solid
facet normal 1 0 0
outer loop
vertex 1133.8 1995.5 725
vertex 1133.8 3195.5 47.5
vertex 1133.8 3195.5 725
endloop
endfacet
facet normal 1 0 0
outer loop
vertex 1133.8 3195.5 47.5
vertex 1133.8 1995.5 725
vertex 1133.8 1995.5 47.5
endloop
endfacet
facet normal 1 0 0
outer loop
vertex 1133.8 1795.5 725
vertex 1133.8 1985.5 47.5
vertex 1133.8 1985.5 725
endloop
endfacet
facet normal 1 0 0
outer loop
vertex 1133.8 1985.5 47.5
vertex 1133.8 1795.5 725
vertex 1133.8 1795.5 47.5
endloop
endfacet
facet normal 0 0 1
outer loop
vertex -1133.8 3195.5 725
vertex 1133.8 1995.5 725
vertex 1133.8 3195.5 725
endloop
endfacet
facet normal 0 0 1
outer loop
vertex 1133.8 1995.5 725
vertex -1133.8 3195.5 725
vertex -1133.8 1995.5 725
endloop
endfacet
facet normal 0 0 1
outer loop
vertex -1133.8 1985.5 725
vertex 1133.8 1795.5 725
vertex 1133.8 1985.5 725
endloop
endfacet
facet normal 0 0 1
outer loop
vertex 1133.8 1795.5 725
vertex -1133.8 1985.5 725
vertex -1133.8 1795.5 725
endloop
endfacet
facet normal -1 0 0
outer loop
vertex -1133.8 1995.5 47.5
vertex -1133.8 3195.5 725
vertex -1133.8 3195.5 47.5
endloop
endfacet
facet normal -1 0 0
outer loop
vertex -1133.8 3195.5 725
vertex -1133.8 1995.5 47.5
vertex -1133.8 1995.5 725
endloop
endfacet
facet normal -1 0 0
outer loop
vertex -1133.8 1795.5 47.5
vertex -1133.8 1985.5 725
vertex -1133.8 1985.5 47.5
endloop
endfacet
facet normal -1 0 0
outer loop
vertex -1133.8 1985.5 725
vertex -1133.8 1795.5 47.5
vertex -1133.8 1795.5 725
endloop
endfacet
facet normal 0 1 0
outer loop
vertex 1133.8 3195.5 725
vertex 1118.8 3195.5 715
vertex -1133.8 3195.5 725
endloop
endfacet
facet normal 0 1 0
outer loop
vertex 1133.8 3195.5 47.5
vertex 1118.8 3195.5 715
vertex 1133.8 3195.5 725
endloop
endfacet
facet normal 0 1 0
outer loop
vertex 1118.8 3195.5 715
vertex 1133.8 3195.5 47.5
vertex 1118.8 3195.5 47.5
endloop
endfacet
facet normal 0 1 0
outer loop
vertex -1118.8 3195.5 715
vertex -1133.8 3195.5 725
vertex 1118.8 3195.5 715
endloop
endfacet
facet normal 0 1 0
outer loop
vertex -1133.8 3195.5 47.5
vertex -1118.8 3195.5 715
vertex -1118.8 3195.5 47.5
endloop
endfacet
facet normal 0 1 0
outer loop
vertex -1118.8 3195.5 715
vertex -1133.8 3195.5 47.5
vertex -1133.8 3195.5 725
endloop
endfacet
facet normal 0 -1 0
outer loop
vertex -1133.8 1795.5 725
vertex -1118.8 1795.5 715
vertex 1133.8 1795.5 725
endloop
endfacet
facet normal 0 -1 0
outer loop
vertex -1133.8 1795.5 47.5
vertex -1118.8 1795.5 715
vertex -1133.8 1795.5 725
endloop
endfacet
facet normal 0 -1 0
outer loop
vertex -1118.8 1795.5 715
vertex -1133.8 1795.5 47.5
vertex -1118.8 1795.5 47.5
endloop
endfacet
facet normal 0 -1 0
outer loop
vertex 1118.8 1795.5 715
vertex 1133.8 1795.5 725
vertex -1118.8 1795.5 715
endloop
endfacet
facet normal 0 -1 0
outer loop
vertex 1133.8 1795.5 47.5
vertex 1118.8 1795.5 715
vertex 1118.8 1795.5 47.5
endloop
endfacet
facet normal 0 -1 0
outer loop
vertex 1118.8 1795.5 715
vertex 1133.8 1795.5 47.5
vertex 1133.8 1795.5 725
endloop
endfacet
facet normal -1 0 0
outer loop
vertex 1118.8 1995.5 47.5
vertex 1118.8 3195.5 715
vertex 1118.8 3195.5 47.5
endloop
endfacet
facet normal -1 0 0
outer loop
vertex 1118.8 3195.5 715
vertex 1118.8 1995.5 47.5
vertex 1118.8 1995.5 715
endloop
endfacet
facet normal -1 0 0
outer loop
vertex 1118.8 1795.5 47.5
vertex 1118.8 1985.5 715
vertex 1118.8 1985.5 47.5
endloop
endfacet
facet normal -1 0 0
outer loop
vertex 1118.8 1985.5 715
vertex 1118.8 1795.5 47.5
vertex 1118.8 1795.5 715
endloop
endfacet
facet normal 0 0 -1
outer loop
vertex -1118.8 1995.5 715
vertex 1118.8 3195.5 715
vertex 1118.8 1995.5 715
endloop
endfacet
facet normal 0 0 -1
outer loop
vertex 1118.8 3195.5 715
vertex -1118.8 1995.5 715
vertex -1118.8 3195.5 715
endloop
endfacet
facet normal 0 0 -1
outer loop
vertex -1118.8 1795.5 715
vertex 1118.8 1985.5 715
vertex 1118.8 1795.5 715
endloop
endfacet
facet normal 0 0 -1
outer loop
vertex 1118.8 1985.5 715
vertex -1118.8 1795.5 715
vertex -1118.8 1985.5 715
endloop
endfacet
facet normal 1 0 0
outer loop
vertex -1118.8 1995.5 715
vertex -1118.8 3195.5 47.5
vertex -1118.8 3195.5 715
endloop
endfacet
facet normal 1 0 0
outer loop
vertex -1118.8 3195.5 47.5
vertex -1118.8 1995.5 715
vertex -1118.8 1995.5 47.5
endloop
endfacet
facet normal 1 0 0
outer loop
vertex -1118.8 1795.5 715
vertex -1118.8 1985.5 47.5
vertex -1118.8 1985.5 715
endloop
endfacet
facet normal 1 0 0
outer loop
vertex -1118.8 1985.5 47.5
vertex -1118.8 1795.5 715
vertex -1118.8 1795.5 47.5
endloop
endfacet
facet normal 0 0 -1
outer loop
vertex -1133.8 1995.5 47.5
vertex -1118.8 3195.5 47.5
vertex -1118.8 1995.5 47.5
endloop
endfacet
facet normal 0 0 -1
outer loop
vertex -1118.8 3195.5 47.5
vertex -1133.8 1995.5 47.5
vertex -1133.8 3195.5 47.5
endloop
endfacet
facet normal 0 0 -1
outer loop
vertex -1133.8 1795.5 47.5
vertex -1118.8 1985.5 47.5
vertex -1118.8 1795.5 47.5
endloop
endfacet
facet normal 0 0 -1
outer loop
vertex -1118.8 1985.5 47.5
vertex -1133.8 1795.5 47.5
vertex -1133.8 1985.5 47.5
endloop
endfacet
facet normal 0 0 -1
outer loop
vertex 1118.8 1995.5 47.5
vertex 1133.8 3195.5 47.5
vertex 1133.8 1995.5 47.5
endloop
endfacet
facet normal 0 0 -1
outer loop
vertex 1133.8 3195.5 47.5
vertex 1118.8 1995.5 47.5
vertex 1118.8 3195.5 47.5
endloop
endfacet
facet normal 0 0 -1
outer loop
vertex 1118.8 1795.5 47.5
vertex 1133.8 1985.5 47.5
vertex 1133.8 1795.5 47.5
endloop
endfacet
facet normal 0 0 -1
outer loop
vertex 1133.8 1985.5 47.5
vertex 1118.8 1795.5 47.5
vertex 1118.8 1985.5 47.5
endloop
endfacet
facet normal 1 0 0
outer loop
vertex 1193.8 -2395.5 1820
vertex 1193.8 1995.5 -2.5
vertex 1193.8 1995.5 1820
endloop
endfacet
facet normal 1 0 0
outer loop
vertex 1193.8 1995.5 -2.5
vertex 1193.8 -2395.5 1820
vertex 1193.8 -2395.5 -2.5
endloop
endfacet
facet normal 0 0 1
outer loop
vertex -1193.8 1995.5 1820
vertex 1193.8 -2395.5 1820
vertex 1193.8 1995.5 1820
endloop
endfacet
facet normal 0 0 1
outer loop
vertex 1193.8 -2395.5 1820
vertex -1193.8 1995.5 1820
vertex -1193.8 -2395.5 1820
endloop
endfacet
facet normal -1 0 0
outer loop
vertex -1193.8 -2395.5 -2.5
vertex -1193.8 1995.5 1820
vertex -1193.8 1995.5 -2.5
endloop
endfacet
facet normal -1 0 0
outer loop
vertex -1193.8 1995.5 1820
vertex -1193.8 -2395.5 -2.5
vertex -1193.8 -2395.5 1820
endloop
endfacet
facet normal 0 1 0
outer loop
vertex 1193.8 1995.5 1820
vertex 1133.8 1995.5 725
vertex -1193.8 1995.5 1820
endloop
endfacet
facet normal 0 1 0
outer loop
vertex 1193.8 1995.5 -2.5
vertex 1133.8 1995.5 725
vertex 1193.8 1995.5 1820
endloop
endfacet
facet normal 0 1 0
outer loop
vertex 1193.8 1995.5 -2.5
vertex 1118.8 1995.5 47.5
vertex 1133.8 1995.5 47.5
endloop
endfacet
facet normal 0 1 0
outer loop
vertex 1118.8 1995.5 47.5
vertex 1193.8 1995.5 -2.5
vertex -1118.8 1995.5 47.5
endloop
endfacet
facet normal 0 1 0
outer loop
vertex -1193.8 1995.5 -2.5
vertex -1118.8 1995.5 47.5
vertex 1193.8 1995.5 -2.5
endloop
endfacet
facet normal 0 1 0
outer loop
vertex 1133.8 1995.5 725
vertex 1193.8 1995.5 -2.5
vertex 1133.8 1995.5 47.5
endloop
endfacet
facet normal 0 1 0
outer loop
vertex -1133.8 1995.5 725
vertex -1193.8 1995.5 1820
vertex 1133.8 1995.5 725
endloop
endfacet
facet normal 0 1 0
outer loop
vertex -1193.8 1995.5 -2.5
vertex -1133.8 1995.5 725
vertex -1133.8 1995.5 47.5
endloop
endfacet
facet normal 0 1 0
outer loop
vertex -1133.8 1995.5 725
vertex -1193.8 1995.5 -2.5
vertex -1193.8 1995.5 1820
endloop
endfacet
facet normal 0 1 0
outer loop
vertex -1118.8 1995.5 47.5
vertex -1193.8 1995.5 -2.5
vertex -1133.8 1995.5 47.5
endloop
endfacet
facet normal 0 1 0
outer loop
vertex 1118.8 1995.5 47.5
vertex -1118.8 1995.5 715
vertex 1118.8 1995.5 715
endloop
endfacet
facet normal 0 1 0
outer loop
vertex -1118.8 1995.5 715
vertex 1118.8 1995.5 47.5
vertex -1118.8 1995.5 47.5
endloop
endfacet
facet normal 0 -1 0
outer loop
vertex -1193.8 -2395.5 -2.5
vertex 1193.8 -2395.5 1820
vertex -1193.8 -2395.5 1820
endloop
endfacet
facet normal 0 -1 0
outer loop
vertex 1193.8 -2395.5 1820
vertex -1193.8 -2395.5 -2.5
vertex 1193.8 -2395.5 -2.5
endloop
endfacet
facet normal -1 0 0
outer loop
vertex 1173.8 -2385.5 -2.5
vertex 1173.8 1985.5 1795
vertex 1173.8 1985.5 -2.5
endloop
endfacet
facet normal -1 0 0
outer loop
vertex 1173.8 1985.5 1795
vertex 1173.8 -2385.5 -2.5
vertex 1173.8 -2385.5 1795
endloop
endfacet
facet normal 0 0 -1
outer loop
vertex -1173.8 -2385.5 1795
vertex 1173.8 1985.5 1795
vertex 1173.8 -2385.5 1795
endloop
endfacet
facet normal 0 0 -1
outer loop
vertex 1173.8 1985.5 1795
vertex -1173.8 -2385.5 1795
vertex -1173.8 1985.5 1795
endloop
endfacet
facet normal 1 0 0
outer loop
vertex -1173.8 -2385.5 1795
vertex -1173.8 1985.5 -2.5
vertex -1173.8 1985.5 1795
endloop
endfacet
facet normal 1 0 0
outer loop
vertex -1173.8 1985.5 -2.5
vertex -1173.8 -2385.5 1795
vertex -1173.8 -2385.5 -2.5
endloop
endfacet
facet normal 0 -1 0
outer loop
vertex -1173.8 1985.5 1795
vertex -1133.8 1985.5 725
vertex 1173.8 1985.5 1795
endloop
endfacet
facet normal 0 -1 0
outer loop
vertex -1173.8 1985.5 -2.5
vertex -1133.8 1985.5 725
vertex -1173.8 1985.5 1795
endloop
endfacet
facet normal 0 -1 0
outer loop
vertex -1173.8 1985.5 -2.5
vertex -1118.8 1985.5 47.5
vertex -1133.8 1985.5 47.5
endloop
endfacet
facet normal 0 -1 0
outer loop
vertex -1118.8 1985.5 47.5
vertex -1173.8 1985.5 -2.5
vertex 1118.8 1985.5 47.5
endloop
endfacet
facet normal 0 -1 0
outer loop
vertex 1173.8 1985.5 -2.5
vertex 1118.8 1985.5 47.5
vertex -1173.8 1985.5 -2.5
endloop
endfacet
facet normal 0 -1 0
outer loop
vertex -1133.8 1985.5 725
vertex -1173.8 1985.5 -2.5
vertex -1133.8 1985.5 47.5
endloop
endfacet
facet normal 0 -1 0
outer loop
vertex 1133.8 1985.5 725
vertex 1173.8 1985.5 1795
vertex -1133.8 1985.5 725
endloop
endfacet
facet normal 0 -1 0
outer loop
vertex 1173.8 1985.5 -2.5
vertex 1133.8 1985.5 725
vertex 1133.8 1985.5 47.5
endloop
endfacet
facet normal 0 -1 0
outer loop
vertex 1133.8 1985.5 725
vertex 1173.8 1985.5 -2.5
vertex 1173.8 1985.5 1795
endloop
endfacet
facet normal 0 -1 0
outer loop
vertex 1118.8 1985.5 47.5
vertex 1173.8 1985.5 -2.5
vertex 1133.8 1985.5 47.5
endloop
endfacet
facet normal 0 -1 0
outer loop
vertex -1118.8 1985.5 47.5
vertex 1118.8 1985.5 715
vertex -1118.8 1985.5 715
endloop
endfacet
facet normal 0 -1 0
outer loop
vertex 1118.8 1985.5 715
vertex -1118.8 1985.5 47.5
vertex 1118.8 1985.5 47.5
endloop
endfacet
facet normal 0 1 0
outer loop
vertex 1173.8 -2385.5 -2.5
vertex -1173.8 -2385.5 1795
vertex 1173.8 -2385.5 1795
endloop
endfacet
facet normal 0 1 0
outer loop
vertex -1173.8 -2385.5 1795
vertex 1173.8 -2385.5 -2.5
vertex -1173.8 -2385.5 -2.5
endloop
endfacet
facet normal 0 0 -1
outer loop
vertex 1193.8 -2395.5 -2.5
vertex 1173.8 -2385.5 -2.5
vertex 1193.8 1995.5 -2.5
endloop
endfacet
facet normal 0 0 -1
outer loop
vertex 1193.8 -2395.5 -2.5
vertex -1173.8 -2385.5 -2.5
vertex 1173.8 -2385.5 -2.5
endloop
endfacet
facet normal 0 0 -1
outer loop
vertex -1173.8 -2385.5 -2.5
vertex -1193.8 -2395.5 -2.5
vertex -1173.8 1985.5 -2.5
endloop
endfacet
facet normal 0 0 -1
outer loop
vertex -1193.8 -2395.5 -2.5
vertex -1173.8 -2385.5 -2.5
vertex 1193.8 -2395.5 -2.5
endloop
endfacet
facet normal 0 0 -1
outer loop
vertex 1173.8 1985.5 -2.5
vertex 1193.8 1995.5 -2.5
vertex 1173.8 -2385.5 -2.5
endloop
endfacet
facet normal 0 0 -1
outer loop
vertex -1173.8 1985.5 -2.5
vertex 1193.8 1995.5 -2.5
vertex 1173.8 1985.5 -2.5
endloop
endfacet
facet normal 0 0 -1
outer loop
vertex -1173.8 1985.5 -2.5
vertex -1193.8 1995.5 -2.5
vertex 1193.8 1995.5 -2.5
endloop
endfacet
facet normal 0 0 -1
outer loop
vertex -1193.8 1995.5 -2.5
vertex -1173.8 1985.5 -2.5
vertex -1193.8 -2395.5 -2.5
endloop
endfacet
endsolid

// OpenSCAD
// ====================================================================================
// REVOLUTIONARY TECHNOLOGY COMPANY & UNIVERSITY OF WASHINGTON DEPARTMENT OF PHYSICS
// Subsystem: suburban_md_body.scad (2027 Suburban HD Extended Passenger Shell)
// Core Application: 3-Row Family Capsule Mated to Original 165" Long-Wheelbase Frame
// COMPLIANCE GATE: Maintains absolute 65mm lower open clearance for underbody armor
// Center Origin (0,0,0) = Mid-point of the Original 165-Inch Frame Baseline Rail Axis
// ====================================================================================

$fn = 100; // Parametric curve panel surface finish resolution

// --- Original 165" Wheelbase Constants (mm) ---
inch_to_mm         = 25.4;
original_wheelbase = 165.0 * inch_to_mm; // Maintained original 4191.00 mm frame length [INDEX]
body_outer_width   = 94.00 * inch_to_mm; // Sized to clear rear dually track boundaries [INDEX]
sheet_metal_thick  = 1.50;               // Heavy fleet-gauge stamped steel skin scale
suburban_height    = 1920.00;            // Full-size extended utility vertical profile

// Underbody Clearance Rule Compliance [INDEX]
UNDER_ARMOR_CLEARANCE_MM = 65.00;

module front_engine_cowl_clip() {
    echo("STAMPING 2027 SUBURBAN REINFORCED FRONT QUARTER CLIP");
    // Front clip wrapper surrounding the 1,850 hp Mega-Flux motor core [INDEX]
    color("DarkBlue") {
        difference() {
            translate([0, original_wheelbase/2 + 400, 350])
                cube([body_outer_width - 120, 1400, 750], center=true);
            translate([0, original_wheelbase/2 + 400, 350])
                cube([body_outer_width - 150, 1404, 730], center=true); // Internal engine cavity
                
            // LOWER PROFILE STANDOFF: Cuts base line to preserve armor installation room [INDEX]
            translate([0, original_wheelbase/2 + 400, -50])
                cube([body_outer_width, 1410, UNDER_ARMOR_CLEARANCE_MM * 3], center=true);
        }
    }
}

module three_row_passenger_vault() {
    echo("COMPILING THREE-ROW FAMILY REINFORCED CABIN CAPSULE");
    // Extended utility interior cabin cell spanning over the floor load-cell balancing pockets [INDEX]
    color("SlateGrey") {
        difference() {
            // Main horizontal extended body block
            translate([0, -200, suburban_height/2 - 100])
                cube([body_outer_width, original_wheelbase + 200, suburban_height], center=true);
            
            // Hollow inner cabin cockpit cave [Leaves room for 2016 fabric seat sets] [INDEX]
            translate([0, -200, suburban_height/2 - 100])
                cube([body_outer_width - 40, original_wheelbase + 180, suburban_height - 50], center=true);
                
            // LOWER CHASSIS STANDOFF OVERRIDE (Rule Compliance) [INDEX]
            translate([0, -200, -100])
                cube([body_outer_width + 10, original_wheelbase + 220, UNDER_ARMOR_CLEARANCE_MM * 3], center=true);
        }
    }
}

// --- Composite Suburban Super-Structure Instantiation ---
union() {
    front_engine_cowl_clip();
    three_row_passenger_vault();
}
